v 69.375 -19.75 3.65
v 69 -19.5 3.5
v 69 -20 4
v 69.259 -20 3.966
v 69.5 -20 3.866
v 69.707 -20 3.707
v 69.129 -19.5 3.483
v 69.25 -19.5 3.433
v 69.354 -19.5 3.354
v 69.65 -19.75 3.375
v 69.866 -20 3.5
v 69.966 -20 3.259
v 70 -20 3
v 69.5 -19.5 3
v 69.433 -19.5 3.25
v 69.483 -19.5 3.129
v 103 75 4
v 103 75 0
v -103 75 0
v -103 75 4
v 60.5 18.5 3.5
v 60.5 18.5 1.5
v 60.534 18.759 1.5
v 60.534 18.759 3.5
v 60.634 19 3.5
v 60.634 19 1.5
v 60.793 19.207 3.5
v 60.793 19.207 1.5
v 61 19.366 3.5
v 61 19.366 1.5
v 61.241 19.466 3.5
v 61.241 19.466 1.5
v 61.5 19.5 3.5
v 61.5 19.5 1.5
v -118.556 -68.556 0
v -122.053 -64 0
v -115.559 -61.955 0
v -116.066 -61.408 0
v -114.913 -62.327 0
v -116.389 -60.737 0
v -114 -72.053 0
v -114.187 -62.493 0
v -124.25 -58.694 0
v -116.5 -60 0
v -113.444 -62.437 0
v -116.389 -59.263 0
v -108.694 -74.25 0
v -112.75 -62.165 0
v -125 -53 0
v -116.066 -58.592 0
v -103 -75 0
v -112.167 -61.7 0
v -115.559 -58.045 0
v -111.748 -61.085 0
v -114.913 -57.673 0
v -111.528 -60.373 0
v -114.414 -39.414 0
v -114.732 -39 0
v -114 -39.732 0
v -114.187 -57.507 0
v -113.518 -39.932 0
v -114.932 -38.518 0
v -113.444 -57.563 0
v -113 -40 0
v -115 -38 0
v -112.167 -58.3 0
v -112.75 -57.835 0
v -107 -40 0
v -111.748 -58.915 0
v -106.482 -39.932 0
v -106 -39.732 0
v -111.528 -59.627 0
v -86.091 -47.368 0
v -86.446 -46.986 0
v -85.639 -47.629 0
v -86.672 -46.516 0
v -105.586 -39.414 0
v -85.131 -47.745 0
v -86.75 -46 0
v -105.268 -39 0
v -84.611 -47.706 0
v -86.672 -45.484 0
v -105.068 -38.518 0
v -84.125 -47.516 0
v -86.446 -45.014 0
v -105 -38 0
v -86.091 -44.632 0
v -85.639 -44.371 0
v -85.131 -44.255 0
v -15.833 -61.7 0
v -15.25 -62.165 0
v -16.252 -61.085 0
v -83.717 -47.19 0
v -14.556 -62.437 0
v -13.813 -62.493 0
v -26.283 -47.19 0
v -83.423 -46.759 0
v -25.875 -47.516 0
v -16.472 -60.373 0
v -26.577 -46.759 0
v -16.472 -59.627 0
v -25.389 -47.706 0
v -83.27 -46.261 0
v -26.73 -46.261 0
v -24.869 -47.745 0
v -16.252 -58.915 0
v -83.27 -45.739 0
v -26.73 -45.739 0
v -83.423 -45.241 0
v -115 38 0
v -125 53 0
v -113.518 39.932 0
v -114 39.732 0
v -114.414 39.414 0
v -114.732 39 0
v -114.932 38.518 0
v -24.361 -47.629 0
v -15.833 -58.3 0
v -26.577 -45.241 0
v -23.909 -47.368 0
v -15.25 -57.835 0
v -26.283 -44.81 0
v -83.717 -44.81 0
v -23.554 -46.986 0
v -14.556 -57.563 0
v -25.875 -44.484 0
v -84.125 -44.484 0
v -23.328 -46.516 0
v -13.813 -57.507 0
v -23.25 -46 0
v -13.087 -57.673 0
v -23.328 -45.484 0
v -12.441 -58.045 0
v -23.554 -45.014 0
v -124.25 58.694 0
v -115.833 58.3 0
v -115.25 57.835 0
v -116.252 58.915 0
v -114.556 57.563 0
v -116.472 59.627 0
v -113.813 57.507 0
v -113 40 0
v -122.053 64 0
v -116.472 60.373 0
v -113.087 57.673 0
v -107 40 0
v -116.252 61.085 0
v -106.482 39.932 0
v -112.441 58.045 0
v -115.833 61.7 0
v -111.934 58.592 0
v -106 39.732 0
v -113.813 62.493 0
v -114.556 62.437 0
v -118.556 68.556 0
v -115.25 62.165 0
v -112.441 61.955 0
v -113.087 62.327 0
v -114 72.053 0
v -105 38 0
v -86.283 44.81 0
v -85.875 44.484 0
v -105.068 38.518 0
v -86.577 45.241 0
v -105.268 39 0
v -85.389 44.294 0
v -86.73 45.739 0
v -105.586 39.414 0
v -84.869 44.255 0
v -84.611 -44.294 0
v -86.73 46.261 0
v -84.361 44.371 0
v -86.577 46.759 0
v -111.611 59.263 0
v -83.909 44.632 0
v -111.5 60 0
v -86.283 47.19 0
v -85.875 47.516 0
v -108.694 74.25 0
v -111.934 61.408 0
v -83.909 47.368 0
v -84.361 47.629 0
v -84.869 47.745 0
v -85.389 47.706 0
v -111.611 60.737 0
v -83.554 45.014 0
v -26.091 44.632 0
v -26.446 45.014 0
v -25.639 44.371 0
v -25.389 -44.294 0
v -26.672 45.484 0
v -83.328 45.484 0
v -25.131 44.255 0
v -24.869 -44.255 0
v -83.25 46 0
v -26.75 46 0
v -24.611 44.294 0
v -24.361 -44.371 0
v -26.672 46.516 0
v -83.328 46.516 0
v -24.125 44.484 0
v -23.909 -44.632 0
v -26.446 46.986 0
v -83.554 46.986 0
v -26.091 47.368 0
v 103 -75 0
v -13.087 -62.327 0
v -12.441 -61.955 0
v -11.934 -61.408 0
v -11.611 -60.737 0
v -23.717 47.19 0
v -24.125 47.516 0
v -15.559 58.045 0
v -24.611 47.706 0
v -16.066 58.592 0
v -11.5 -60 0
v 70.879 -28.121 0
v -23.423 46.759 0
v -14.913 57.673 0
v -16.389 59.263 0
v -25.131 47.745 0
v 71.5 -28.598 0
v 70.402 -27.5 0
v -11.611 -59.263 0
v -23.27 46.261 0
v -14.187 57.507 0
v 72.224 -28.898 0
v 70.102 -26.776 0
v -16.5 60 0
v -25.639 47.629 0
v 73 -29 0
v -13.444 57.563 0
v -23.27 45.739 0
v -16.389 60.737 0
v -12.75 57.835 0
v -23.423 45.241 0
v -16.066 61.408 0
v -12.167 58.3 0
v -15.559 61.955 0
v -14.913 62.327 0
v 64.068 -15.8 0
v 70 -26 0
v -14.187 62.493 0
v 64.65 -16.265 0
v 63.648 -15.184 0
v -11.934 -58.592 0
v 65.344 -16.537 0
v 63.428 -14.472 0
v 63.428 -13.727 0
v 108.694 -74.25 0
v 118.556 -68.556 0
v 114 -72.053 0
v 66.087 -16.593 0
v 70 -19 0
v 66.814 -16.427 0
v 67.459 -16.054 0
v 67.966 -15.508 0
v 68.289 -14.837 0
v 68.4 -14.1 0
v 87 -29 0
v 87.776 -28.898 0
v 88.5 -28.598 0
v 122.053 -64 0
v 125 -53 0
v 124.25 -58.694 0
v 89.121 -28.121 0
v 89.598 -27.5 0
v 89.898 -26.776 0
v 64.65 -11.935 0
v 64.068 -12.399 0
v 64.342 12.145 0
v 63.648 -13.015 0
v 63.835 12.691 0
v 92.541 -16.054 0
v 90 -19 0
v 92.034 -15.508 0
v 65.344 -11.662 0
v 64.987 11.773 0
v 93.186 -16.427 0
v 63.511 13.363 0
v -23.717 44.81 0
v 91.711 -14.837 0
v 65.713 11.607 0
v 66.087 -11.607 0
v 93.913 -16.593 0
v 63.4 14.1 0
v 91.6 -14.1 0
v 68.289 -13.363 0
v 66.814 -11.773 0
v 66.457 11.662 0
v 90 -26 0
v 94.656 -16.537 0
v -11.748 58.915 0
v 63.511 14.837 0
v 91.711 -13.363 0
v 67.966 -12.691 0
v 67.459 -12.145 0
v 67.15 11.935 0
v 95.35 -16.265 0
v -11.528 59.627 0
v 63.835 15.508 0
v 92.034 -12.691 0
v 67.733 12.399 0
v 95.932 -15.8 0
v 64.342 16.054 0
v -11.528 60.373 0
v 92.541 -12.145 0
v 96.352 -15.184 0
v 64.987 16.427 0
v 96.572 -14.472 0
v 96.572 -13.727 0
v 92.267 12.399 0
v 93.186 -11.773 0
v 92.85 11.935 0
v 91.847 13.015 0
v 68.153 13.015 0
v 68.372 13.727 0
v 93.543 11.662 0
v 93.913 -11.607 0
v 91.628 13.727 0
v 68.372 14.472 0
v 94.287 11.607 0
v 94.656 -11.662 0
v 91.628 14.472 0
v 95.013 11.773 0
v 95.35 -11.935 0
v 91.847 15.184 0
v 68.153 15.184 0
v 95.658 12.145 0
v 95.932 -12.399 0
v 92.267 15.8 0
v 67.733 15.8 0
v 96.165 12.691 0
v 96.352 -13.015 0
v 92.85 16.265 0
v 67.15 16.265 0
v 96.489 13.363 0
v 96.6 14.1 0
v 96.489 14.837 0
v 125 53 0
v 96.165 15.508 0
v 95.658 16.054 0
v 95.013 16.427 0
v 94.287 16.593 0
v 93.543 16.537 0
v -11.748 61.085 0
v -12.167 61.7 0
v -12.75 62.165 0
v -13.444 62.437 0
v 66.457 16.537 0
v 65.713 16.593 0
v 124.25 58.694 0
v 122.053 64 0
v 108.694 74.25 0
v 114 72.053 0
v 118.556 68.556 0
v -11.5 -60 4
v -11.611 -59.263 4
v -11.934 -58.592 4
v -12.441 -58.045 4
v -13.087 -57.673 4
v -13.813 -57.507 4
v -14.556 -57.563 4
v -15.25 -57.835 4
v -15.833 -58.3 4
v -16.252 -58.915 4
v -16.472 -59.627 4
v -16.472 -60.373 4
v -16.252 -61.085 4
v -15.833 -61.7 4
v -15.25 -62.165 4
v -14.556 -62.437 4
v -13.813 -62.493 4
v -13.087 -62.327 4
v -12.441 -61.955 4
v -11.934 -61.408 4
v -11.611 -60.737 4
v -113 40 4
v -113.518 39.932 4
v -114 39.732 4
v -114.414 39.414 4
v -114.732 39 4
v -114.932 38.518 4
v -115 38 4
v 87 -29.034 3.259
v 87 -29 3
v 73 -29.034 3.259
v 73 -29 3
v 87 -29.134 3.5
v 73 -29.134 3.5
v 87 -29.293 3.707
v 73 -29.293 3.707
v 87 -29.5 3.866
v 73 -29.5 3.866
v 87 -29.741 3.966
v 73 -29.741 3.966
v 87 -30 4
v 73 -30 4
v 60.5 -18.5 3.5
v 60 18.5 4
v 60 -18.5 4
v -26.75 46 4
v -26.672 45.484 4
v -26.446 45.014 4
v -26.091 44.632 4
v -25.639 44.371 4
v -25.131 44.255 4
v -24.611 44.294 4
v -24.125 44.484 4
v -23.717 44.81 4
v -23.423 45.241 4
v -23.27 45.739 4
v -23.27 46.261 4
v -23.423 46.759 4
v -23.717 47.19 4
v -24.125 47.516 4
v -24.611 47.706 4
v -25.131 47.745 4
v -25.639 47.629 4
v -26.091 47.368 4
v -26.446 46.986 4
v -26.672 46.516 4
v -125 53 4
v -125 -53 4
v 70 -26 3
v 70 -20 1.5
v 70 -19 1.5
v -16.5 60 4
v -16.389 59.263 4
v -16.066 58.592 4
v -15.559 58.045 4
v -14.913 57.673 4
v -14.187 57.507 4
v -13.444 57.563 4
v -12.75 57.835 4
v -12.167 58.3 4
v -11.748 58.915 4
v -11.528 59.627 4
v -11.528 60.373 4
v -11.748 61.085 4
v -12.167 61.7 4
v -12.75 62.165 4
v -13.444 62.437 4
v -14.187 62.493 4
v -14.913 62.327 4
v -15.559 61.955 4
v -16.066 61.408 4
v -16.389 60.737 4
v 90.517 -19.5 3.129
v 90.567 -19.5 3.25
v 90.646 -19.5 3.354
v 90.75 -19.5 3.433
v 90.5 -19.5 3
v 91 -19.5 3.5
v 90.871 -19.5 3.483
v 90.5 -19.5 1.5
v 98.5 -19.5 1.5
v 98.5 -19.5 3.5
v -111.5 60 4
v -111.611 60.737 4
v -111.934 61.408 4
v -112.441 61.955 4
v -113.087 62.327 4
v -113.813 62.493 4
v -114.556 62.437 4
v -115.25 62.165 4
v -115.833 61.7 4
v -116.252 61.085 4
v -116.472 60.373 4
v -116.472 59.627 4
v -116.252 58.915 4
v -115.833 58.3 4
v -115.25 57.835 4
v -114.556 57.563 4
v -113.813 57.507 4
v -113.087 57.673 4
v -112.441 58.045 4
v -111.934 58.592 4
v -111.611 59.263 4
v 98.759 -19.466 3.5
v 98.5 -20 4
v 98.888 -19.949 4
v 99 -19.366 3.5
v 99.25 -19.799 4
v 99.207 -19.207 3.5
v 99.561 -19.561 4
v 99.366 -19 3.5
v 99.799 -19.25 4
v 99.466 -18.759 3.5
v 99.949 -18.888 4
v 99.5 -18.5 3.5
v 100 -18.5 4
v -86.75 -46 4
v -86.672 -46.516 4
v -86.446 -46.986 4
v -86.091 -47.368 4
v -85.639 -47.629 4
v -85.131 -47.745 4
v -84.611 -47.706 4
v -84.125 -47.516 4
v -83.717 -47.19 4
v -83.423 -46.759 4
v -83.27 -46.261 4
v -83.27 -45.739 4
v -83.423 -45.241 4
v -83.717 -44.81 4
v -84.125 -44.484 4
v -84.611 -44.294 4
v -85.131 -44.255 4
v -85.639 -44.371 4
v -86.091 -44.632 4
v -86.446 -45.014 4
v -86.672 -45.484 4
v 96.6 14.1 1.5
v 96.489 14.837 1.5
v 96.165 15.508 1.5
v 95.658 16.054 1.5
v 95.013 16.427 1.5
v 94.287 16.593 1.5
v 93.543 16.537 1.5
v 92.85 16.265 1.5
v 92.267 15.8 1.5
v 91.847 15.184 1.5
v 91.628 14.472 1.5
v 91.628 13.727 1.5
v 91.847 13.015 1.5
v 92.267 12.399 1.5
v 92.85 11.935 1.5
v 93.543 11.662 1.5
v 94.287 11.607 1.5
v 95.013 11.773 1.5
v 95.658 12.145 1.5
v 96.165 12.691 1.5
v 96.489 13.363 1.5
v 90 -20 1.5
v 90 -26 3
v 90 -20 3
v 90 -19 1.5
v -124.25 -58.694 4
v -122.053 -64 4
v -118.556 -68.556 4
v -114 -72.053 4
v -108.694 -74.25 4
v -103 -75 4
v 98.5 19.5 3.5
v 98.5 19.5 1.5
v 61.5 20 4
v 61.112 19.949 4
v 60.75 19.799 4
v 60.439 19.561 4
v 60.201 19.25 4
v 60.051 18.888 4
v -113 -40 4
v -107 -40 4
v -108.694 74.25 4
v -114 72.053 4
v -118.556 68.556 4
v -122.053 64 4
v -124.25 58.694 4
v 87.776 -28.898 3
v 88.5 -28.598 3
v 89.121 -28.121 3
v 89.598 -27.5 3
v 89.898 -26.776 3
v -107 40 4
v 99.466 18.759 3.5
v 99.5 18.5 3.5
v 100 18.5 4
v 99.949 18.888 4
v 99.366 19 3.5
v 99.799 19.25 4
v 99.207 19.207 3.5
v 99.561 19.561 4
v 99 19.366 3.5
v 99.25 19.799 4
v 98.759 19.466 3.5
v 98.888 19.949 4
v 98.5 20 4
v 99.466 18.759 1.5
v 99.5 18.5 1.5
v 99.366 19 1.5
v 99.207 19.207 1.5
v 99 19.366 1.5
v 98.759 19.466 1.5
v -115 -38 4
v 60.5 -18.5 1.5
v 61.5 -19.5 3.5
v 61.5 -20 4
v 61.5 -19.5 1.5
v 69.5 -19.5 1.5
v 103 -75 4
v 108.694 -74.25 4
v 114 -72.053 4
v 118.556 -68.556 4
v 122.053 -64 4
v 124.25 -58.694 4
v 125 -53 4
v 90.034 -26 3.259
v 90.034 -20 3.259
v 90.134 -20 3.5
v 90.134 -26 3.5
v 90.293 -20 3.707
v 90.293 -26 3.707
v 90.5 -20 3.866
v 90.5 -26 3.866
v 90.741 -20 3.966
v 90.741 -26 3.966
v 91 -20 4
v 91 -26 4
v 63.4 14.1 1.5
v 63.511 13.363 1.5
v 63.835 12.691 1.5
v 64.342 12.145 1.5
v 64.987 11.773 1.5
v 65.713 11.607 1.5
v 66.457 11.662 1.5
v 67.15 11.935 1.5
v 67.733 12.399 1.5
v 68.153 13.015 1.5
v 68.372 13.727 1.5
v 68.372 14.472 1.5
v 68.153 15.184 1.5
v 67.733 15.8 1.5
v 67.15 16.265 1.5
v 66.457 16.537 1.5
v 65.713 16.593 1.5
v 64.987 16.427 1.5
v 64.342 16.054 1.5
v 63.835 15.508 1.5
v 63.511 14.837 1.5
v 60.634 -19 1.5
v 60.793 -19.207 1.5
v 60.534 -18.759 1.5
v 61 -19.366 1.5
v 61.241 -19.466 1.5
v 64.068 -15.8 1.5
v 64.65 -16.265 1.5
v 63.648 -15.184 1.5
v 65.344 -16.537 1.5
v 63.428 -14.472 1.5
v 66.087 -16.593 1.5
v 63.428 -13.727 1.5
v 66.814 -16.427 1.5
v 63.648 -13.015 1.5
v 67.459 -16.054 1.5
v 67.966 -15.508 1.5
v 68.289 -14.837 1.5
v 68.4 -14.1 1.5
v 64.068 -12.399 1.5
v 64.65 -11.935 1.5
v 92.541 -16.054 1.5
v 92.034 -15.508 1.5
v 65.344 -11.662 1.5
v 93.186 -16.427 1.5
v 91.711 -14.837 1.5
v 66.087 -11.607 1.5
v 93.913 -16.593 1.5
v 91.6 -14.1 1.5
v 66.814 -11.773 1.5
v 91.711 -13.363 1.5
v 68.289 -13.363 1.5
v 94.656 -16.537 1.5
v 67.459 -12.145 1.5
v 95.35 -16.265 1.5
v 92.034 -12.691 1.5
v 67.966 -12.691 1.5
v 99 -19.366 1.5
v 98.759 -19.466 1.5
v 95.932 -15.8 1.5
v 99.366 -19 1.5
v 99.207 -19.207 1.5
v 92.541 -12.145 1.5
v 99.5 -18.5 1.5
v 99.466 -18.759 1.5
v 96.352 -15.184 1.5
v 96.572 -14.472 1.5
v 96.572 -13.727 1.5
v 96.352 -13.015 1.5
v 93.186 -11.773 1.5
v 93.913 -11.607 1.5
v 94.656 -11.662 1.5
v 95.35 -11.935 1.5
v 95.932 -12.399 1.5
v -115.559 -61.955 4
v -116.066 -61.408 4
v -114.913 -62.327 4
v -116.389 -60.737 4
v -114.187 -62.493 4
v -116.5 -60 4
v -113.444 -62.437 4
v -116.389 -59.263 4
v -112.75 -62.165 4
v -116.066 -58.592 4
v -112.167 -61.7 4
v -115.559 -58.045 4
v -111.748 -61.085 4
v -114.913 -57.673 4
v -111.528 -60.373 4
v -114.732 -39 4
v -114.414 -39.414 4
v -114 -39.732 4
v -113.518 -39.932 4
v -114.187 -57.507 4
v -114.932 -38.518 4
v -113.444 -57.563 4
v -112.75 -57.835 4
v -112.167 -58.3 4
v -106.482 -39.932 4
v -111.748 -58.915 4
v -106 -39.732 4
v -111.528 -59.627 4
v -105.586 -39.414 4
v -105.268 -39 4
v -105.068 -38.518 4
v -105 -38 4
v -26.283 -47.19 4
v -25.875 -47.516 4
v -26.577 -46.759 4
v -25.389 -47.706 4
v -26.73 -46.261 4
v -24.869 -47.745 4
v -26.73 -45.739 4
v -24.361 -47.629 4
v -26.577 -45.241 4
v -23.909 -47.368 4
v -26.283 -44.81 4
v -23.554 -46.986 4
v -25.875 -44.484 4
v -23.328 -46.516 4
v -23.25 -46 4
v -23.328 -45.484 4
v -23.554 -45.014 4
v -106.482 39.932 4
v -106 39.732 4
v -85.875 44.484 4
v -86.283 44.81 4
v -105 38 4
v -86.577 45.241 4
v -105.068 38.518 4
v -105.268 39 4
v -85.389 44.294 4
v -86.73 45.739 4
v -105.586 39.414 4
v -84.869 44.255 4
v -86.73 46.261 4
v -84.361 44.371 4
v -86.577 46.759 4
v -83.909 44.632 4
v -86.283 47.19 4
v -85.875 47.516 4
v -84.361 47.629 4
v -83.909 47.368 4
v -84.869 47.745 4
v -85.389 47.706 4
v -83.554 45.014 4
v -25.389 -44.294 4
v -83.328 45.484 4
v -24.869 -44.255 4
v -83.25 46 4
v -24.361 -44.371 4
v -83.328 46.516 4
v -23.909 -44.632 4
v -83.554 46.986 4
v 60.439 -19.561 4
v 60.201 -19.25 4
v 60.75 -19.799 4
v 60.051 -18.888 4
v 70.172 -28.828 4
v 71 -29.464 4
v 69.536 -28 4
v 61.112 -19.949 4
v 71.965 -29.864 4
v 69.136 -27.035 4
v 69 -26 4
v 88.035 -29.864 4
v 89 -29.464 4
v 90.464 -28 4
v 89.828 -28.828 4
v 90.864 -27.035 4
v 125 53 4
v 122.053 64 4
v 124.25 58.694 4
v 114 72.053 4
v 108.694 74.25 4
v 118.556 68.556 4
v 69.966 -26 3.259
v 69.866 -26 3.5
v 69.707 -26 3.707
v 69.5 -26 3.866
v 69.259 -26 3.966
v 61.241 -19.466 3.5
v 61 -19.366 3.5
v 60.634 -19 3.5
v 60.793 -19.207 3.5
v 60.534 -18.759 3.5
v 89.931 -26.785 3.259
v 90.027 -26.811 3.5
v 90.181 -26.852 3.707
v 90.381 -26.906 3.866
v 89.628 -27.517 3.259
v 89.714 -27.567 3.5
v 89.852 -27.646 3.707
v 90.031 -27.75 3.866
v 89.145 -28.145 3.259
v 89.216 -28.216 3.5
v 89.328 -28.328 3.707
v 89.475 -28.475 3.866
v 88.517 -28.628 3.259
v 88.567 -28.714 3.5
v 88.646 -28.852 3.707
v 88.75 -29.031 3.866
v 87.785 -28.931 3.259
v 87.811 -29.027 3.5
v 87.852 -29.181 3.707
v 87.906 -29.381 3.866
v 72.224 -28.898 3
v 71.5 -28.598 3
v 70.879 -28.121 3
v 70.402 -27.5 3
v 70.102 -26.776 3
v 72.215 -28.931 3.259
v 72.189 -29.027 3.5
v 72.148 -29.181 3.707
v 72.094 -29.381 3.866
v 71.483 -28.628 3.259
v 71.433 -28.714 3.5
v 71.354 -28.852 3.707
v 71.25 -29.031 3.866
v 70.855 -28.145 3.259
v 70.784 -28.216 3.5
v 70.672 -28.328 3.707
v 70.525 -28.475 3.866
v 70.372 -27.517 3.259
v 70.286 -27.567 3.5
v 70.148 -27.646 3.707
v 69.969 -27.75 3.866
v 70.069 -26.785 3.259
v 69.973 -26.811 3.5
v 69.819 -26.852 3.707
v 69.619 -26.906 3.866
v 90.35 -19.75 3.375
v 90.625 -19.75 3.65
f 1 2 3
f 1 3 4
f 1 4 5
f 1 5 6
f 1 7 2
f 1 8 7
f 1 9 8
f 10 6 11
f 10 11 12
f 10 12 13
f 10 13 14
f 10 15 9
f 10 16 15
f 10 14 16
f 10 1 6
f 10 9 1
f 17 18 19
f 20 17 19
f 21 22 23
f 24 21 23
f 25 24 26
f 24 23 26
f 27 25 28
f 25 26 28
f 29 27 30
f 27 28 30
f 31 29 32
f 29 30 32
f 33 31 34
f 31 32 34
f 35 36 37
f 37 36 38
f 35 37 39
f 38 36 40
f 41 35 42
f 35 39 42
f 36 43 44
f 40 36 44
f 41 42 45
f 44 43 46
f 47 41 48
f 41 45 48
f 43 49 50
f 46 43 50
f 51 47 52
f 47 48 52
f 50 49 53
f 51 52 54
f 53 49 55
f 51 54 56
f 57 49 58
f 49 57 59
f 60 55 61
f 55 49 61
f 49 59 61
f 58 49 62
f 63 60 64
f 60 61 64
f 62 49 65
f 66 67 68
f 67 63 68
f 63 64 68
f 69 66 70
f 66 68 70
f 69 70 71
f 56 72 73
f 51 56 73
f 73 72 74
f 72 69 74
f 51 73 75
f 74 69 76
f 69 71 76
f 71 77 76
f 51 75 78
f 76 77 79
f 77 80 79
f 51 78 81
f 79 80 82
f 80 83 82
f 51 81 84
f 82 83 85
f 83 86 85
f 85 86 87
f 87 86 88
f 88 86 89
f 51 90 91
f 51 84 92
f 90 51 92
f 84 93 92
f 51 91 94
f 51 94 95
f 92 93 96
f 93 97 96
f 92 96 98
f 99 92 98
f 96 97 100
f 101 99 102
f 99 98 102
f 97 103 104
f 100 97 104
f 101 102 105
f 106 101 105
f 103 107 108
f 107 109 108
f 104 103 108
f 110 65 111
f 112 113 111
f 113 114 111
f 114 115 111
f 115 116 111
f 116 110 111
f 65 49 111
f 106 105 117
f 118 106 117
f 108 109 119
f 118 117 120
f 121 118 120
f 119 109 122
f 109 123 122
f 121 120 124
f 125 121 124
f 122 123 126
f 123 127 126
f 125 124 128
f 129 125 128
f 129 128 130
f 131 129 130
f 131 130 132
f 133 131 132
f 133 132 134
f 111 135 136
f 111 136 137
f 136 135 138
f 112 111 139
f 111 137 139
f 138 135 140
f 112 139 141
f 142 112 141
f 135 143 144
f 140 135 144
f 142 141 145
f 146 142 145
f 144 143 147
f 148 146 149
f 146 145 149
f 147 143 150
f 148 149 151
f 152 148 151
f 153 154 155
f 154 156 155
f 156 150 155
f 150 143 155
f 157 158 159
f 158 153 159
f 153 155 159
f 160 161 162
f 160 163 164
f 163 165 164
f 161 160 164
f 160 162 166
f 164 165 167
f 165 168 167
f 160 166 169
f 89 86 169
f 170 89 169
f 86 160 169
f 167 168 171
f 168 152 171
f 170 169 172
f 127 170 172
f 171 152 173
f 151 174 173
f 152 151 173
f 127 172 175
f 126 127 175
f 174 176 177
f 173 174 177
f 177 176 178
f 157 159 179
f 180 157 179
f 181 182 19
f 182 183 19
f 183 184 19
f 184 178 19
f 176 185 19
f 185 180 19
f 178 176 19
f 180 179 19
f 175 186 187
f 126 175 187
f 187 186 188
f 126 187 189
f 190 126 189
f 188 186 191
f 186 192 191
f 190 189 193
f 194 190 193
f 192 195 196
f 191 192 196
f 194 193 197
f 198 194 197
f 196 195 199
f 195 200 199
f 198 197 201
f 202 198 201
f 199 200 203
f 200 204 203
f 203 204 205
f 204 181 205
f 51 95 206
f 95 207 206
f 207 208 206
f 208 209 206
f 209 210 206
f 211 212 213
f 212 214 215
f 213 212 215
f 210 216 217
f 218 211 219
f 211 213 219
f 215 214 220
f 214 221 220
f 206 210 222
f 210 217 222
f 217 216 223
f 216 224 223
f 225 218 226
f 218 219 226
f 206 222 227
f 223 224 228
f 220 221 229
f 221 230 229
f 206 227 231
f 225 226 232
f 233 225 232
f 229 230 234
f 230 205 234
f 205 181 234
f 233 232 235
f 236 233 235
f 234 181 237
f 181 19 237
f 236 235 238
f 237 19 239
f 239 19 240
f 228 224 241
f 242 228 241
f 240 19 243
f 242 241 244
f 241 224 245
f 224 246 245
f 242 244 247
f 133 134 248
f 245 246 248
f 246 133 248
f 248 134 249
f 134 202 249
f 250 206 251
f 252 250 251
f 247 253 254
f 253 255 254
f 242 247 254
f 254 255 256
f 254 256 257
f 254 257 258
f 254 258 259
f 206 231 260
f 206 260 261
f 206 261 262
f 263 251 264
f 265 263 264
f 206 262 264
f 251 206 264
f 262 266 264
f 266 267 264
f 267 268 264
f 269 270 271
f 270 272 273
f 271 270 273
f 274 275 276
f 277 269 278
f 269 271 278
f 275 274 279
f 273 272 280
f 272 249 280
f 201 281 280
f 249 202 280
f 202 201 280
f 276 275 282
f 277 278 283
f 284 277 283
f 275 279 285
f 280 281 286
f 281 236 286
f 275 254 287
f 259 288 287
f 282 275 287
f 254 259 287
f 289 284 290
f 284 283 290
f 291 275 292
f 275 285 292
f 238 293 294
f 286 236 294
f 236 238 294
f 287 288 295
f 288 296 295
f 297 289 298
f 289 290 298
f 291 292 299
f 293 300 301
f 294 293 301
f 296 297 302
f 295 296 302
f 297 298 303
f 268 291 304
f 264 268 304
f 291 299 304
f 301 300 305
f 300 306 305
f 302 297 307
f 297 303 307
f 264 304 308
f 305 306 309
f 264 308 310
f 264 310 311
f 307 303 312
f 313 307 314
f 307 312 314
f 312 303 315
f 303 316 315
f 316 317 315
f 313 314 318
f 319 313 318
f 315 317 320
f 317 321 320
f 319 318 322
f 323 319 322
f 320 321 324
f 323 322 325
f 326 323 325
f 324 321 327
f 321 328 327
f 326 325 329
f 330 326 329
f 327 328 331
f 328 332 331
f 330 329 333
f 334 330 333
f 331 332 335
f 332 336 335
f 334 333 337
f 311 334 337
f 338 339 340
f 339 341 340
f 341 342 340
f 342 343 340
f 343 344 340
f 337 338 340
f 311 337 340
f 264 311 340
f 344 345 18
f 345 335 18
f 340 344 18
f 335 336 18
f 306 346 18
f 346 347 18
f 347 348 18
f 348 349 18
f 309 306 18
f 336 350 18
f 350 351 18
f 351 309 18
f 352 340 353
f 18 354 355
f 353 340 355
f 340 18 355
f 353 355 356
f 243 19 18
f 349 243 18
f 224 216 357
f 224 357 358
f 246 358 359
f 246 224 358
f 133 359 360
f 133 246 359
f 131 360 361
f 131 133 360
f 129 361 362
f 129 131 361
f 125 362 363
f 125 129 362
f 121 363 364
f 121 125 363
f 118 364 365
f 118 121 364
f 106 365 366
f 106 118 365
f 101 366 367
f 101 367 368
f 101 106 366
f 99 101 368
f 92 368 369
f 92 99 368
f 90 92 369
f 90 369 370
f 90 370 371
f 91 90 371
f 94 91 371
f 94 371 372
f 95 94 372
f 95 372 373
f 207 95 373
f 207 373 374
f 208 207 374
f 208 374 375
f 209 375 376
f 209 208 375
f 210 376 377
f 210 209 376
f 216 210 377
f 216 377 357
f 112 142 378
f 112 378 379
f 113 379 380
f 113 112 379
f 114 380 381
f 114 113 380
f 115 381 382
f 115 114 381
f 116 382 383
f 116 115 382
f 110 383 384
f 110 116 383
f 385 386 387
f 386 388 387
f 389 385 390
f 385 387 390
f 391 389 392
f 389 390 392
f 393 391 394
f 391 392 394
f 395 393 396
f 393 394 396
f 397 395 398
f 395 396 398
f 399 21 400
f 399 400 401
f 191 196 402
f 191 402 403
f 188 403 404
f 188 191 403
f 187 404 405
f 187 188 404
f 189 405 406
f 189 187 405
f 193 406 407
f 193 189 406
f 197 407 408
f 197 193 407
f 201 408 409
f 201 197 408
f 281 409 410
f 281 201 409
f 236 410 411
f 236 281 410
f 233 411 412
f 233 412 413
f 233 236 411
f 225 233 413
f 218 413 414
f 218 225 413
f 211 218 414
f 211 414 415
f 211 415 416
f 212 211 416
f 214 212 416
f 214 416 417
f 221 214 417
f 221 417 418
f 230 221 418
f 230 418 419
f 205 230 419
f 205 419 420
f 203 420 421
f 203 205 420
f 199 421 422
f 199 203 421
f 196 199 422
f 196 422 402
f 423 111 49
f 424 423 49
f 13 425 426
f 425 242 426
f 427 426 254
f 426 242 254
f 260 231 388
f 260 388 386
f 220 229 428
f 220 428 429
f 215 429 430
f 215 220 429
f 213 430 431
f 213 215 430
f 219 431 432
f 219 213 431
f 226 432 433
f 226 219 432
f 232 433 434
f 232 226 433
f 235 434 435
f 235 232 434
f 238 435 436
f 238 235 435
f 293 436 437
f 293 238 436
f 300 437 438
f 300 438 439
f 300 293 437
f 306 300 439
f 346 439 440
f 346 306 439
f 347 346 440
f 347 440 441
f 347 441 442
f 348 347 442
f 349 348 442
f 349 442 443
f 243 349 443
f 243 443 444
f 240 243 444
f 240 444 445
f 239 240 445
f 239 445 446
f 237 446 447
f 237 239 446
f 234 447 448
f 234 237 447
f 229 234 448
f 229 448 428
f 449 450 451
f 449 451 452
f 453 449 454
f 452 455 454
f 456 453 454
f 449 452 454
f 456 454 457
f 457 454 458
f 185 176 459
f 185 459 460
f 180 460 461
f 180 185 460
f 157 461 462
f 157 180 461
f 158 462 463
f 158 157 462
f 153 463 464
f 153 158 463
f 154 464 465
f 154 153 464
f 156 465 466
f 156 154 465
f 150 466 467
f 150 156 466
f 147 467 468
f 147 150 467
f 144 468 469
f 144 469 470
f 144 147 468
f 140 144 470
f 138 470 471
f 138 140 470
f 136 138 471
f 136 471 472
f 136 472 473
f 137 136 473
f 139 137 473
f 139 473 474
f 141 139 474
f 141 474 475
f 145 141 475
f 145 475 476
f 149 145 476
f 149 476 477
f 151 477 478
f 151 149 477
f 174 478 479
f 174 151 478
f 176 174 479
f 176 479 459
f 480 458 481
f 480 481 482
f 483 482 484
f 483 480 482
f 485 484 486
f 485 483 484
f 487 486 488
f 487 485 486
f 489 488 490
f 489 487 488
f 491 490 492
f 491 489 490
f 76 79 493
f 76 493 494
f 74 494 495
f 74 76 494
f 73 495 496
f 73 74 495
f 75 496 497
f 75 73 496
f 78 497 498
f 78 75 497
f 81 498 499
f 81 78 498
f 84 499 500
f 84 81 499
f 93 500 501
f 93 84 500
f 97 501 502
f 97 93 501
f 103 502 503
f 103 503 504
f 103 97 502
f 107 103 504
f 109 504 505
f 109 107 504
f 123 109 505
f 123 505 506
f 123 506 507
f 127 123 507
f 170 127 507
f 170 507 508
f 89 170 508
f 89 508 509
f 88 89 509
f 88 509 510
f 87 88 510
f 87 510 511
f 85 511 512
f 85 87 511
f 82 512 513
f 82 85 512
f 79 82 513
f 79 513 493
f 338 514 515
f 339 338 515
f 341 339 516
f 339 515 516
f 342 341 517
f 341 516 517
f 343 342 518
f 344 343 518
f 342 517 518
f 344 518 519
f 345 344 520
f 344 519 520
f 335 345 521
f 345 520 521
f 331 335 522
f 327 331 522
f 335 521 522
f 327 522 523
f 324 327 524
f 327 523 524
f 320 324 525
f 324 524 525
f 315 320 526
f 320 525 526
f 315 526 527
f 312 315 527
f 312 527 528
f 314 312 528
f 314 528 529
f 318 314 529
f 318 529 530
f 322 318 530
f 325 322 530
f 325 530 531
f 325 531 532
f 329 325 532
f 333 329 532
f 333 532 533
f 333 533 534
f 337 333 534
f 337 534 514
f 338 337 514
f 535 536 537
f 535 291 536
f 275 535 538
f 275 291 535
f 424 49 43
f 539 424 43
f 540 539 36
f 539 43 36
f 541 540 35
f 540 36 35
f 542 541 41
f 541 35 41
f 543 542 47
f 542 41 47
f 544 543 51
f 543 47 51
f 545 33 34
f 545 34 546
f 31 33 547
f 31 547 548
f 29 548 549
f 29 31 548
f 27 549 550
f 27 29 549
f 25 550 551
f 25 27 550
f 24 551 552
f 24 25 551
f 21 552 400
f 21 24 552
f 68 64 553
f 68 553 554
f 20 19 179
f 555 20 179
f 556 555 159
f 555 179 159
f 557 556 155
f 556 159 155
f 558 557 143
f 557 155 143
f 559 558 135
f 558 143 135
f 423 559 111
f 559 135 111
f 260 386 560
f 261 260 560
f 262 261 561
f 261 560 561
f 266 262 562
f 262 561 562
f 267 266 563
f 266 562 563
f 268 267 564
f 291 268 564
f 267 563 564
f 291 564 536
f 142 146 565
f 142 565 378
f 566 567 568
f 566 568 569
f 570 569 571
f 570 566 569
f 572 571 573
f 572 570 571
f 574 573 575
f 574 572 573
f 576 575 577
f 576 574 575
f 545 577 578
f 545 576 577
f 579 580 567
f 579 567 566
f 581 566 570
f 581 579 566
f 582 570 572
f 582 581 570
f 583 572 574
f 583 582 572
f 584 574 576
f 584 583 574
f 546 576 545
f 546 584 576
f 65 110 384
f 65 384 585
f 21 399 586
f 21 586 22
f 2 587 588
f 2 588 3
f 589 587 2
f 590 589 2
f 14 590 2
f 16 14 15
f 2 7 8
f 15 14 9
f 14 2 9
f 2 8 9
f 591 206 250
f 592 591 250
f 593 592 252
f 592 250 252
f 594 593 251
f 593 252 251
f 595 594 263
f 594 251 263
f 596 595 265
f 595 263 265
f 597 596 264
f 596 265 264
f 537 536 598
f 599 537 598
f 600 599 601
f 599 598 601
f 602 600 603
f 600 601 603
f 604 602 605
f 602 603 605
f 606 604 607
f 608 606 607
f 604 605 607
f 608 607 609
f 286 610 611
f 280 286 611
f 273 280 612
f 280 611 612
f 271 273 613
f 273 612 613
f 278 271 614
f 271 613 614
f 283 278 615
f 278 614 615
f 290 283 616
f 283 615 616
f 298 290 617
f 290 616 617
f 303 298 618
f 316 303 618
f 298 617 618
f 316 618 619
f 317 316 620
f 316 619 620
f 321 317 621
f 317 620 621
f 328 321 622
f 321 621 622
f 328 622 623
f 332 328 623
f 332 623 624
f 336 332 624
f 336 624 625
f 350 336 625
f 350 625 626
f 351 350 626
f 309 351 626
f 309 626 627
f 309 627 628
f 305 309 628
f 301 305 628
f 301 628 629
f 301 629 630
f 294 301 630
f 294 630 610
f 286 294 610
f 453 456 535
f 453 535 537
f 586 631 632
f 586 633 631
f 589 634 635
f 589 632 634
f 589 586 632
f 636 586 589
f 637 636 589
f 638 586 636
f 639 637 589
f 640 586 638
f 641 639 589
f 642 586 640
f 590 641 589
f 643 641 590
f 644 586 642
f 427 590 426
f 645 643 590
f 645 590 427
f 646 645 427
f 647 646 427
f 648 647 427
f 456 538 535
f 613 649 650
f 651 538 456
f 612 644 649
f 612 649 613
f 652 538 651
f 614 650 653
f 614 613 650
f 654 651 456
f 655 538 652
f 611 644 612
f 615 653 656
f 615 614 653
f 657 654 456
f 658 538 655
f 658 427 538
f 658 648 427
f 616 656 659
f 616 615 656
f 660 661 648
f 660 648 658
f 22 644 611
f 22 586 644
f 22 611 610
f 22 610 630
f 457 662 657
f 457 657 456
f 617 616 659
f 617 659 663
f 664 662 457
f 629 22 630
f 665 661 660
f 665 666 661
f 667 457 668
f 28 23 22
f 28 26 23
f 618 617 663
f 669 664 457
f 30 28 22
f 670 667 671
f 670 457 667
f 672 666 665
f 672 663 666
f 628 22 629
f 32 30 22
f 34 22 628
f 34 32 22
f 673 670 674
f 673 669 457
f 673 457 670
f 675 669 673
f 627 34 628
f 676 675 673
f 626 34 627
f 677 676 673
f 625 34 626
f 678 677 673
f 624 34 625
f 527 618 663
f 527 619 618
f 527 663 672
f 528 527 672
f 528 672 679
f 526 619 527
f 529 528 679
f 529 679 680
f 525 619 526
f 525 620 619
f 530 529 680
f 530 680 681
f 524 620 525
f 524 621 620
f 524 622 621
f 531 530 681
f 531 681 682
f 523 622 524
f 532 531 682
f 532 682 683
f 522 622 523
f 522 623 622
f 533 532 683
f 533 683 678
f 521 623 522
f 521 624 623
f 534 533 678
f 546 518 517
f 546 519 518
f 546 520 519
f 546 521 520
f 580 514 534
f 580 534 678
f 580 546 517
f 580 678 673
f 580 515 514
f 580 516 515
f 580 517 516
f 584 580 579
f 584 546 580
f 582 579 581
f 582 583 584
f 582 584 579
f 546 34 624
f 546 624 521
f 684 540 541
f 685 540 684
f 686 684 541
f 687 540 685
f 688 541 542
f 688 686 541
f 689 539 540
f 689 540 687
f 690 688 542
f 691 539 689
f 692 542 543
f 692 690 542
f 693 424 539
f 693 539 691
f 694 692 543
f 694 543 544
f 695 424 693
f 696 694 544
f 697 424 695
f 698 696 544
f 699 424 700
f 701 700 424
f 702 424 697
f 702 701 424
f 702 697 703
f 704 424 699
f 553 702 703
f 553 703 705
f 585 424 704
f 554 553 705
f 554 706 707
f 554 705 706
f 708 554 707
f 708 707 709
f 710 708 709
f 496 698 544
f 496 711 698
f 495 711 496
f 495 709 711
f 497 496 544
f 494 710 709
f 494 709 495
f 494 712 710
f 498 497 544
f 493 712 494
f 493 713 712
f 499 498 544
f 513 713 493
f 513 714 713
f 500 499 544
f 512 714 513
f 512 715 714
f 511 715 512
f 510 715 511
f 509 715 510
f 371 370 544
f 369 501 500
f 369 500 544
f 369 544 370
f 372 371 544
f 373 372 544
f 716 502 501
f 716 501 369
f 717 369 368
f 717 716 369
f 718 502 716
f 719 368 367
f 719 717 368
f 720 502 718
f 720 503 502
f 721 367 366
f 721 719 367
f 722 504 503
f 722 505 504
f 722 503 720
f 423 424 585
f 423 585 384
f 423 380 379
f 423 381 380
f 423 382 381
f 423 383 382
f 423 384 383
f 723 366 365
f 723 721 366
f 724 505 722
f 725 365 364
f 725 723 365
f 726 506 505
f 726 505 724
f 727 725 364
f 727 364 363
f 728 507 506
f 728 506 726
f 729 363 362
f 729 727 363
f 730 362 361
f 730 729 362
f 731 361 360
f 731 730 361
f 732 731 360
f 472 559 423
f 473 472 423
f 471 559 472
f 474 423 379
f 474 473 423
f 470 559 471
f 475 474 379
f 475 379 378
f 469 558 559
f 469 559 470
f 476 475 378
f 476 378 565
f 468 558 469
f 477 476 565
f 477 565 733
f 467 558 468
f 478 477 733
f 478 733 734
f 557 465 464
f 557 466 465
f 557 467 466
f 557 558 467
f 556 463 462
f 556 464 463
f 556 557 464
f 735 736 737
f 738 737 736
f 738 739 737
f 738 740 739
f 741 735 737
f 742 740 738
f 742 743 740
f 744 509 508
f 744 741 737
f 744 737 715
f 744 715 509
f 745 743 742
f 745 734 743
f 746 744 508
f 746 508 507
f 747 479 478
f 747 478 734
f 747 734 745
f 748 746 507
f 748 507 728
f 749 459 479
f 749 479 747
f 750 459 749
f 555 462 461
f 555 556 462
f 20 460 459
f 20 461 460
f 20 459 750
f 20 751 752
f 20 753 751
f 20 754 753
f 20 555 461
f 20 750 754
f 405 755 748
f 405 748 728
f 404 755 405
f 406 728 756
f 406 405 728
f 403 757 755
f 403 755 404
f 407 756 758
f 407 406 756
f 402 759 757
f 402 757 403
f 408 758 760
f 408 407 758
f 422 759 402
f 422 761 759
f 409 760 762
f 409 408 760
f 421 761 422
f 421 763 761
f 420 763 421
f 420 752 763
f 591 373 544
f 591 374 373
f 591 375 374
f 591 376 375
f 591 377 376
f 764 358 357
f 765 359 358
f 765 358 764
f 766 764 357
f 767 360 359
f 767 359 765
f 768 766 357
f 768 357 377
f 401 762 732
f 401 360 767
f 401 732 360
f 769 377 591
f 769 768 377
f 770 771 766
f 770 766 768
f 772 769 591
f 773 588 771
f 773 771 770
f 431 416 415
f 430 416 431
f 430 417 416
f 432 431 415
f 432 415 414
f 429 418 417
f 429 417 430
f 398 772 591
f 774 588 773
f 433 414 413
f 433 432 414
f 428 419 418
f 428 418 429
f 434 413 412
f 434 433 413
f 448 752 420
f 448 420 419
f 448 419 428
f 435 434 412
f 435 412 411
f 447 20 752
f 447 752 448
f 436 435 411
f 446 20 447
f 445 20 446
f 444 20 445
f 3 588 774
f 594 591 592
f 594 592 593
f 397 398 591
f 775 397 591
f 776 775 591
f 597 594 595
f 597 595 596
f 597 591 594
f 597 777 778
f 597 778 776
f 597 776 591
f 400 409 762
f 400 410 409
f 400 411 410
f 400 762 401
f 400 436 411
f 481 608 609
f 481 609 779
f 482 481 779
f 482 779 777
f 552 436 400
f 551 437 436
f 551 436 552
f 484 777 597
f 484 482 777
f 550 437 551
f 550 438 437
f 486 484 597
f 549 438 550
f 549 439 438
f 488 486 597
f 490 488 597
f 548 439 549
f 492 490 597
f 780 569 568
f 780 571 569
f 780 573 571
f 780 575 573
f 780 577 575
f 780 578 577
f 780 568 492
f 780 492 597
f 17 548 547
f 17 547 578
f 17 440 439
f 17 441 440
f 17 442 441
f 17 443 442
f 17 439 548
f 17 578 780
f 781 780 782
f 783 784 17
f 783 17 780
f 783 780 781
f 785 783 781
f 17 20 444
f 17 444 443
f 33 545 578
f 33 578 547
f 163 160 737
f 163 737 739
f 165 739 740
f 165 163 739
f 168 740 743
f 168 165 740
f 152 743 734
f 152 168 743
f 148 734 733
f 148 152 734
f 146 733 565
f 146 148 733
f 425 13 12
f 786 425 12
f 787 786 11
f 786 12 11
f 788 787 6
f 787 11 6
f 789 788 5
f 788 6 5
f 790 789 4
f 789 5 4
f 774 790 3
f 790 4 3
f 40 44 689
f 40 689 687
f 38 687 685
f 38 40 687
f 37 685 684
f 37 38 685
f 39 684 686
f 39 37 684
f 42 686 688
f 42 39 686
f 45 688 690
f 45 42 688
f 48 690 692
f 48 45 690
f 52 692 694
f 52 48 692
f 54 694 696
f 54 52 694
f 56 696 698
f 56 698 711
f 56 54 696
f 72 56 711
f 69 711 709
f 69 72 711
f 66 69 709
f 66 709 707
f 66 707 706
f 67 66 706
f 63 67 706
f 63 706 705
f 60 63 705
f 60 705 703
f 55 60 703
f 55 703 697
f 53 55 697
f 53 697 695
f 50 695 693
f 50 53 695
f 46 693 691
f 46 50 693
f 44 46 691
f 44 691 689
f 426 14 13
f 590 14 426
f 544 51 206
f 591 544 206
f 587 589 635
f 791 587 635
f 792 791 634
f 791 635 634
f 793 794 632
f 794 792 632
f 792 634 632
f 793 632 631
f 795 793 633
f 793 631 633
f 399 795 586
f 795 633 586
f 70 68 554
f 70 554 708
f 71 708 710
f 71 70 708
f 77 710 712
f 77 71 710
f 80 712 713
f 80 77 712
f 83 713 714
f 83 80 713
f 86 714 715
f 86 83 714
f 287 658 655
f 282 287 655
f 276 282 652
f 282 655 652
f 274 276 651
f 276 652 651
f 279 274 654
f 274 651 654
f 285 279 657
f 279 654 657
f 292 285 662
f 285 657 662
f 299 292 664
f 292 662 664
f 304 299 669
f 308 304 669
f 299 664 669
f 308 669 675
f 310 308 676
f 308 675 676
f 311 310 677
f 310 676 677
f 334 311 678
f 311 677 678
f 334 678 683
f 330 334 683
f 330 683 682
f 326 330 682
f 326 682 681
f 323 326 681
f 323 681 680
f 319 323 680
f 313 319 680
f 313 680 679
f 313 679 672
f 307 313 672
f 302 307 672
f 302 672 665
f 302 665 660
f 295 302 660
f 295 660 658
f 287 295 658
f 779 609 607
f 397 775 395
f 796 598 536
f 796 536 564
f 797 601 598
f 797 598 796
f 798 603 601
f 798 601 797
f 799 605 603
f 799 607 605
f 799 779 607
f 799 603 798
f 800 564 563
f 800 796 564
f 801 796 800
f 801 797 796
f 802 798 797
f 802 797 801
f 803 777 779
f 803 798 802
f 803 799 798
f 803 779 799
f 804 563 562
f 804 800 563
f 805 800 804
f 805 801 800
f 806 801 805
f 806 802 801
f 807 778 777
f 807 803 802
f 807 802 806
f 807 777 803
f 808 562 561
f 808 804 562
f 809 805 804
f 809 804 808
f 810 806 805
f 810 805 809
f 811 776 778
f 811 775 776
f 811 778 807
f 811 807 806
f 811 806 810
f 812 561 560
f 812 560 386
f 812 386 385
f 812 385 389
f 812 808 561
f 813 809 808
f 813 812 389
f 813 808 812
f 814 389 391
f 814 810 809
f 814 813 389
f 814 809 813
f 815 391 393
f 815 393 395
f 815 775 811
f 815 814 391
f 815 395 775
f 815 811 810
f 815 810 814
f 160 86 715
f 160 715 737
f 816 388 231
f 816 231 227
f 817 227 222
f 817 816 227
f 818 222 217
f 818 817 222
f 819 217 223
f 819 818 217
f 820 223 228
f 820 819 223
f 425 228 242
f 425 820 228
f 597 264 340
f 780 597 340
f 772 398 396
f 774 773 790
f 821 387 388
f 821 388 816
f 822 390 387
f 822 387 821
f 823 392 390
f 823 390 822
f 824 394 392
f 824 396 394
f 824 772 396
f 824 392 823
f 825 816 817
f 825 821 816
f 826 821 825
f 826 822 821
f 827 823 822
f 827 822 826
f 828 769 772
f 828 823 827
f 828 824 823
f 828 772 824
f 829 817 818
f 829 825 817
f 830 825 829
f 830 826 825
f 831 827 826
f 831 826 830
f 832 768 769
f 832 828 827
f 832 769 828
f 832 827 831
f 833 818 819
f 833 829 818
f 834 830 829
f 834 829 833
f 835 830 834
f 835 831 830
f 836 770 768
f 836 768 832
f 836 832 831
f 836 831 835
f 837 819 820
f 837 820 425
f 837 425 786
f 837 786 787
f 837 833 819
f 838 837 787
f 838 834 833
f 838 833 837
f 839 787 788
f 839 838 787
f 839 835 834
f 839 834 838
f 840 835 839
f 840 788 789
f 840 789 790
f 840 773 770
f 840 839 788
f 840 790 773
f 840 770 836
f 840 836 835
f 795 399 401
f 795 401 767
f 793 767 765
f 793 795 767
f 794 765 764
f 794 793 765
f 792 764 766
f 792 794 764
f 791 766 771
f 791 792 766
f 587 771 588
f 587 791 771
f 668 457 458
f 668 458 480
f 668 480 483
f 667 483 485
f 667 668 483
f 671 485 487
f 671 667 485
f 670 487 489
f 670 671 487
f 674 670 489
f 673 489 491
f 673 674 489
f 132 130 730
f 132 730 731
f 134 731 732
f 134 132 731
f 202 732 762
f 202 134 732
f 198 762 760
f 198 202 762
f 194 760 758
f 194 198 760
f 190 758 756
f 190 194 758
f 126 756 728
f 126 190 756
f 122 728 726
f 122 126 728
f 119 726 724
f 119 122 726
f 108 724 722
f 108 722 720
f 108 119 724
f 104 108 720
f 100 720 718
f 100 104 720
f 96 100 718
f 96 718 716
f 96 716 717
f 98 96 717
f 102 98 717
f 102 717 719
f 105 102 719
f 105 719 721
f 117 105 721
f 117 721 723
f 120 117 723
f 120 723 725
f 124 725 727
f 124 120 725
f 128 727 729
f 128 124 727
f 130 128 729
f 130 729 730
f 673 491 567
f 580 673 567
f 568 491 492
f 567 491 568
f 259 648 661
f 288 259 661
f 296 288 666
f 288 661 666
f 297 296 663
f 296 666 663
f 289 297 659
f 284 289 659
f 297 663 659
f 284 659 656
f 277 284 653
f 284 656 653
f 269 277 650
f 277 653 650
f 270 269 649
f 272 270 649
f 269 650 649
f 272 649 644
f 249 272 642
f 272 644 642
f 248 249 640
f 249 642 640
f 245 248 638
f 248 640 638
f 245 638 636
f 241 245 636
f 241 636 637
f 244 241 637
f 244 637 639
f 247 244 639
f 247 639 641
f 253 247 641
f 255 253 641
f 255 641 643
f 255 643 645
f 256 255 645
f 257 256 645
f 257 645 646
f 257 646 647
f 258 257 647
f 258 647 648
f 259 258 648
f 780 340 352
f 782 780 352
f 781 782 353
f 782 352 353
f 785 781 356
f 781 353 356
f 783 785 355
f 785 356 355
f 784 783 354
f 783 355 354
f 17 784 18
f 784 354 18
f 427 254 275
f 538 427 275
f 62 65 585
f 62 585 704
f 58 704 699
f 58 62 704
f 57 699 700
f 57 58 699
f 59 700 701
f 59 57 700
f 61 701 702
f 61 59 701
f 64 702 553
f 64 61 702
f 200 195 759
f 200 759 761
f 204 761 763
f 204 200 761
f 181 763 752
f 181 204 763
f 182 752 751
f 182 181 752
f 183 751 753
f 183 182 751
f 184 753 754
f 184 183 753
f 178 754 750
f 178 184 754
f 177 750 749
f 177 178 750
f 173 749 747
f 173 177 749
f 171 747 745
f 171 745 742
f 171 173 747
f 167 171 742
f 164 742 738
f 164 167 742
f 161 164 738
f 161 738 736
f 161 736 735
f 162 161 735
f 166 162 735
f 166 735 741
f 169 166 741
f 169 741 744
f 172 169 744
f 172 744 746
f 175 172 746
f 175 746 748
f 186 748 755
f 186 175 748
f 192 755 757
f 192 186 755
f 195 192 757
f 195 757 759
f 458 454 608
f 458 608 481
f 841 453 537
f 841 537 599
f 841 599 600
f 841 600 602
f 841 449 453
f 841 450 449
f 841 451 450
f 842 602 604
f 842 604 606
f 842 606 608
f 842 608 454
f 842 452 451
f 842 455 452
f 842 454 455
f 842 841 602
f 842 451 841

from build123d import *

# Parameters (mm, degrees)
SKETCH_1_R          = 2.5
SKETCH_1_R_2        = 1.75
SKETCH_1_W          = 20
SKETCH_1_H          = 10
EXTRUDE_1_DEPTH     = 4
SKETCH_2_W          = 39
SKETCH_2_H          = 39
CUT_EXTRUDE_1_DEPTH = 2.5
FILLET_1_R          = 3
FILLET_2_R          = 1
CHAMFER_1_SIZE      = 0.5
SKETCH_4_R          = 2.5
CUT_EXTRUDE_2_DEPTH = 2


with BuildPart() as part:
    # 草图1 → 凸台-拉伸1 (new body)
    with BuildSketch(Plane.XY):
        with BuildLine():
            Line((-103, -75), (103, -75))
            ThreePointArc((103, -75), (118.556349186, -68.556349186), (125, -53))
            Line((125, -53), (125, 53))
            ThreePointArc((125, 53), (118.556349186, 68.556349186), (103, 75))
            Line((103, 75), (-103, 75))
            ThreePointArc((-103, 75), (-118.556349186, 68.556349186), (-125, 53))
            Line((-125, 53), (-125, -53))
            ThreePointArc((-125, -53), (-118.556349186, -68.556349186), (-103, -75))
        make_face()
        with Locations((-114, 60)):
            Circle(SKETCH_1_R, mode=Mode.SUBTRACT)
        with Locations(Location((-114, -60, 0), (0, 0, 180))):
            Circle(SKETCH_1_R, mode=Mode.SUBTRACT)
        with Locations((-14, -60)):
            Circle(SKETCH_1_R, mode=Mode.SUBTRACT)
        with Locations(Location((-14, 60, 0), (0, 0, 180))):
            Circle(SKETCH_1_R, mode=Mode.SUBTRACT)
        with Locations((-85, 46)):
            Circle(SKETCH_1_R_2, mode=Mode.SUBTRACT)
        with Locations(Location((-25, 46, 0), (0, 0, 180))):
            Circle(SKETCH_1_R_2, mode=Mode.SUBTRACT)
        with Locations((-25, -46)):
            Circle(SKETCH_1_R_2, mode=Mode.SUBTRACT)
        with Locations(Location((-85, -46, 0), (0, 0, 180))):
            Circle(SKETCH_1_R_2, mode=Mode.SUBTRACT)
        with BuildLine():
            Line((-113, -40), (-107, -40))
            ThreePointArc((-107, -40), (-105.585786438, -39.414213562), (-105, -38))
            Line((-105, -38), (-105, 38))
            ThreePointArc((-105, 38), (-105.585786438, 39.414213562), (-107, 40))
            Line((-107, 40), (-113, 40))
            ThreePointArc((-113, 40), (-114.414213562, 39.414213562), (-115, 38))
            Line((-115, 38), (-115, -38))
            ThreePointArc((-115, -38), (-114.414213562, -39.414213562), (-113, -40))
        make_face(mode=Mode.SUBTRACT)
        with Locations((80, -24)):
            Rectangle(SKETCH_1_W, SKETCH_1_H, mode=Mode.SUBTRACT)
    extrude(amount=EXTRUDE_1_DEPTH)

    # 草图2 → 切除-拉伸1 (cut)
    with BuildSketch(Plane.XY.offset(4)):
        with Locations((80, 0)):
            Rectangle(SKETCH_2_W, SKETCH_2_H)
    extrude(amount=-CUT_EXTRUDE_1_DEPTH, mode=Mode.SUBTRACT)

    # 圆角1
    fillet_1_edges = [part.edges().sort_by_distance(p)[0] for p in [
        (90, -29, 2),
        (70, -29, 2),
    ]]
    fillet(fillet_1_edges, radius=FILLET_1_R)

    # 圆角2
    fillet_2_edges = [part.edges().sort_by_distance(p)[0] for p in [
        (70, -22.75, 4),
        (99.5, -19.5, 2.75),
        (99.5, 19.5, 2.75),
        (60.5, -19.5, 2.75),
        (60.5, 19.5, 2.75),
        (80, -29, 4),
        (90, -22.75, 4),
        (89.121320344, -28.121320344, 4),
        (70.878679656, -28.121320344, 4),
    ]]
    fillet(fillet_2_edges, radius=FILLET_2_R)

    # 倒角1
    chamfer_1_edges = [part.edges().sort_by_distance(p)[0] for p in [
        (90, -19.5, 2.25),
        (70, -19.5, 2.25),
        (99.5, 0, 4),
        (94.75, -19.5, 4),
        (65.25, -19.5, 4),
        (60.5, 0, 4),
        (80, 19.5, 4),
        (69.707106781, -19.5, 3.707106781),
        (90.292893219, -19.5, 3.707106781),
        (60.792893219, -19.207106781, 4),
        (99.207106781, -19.207106781, 4),
        (99.207106781, 19.207106781, 4),
        (60.792893219, 19.207106781, 4),
    ]]
    chamfer(chamfer_1_edges, length=CHAMFER_1_SIZE)

    # 草图4 → 切除-拉伸2 (cut)
    with BuildSketch(Plane.XY.offset(1.5)):
        with Locations((65.900290783, -14.099709217)):
            Circle(SKETCH_4_R)
        with Locations(Location((94.099709217, -14.099709217, 0), (0, 0, 180))):
            Circle(SKETCH_4_R)
        with Locations((94.099709217, 14.099709217)):
            Circle(SKETCH_4_R)
        with Locations(Location((65.900290783, 14.099709217, 0), (0, 0, 180))):
            Circle(SKETCH_4_R)
    extrude(amount=-CUT_EXTRUDE_2_DEPTH, mode=Mode.SUBTRACT)


solid = part.part
